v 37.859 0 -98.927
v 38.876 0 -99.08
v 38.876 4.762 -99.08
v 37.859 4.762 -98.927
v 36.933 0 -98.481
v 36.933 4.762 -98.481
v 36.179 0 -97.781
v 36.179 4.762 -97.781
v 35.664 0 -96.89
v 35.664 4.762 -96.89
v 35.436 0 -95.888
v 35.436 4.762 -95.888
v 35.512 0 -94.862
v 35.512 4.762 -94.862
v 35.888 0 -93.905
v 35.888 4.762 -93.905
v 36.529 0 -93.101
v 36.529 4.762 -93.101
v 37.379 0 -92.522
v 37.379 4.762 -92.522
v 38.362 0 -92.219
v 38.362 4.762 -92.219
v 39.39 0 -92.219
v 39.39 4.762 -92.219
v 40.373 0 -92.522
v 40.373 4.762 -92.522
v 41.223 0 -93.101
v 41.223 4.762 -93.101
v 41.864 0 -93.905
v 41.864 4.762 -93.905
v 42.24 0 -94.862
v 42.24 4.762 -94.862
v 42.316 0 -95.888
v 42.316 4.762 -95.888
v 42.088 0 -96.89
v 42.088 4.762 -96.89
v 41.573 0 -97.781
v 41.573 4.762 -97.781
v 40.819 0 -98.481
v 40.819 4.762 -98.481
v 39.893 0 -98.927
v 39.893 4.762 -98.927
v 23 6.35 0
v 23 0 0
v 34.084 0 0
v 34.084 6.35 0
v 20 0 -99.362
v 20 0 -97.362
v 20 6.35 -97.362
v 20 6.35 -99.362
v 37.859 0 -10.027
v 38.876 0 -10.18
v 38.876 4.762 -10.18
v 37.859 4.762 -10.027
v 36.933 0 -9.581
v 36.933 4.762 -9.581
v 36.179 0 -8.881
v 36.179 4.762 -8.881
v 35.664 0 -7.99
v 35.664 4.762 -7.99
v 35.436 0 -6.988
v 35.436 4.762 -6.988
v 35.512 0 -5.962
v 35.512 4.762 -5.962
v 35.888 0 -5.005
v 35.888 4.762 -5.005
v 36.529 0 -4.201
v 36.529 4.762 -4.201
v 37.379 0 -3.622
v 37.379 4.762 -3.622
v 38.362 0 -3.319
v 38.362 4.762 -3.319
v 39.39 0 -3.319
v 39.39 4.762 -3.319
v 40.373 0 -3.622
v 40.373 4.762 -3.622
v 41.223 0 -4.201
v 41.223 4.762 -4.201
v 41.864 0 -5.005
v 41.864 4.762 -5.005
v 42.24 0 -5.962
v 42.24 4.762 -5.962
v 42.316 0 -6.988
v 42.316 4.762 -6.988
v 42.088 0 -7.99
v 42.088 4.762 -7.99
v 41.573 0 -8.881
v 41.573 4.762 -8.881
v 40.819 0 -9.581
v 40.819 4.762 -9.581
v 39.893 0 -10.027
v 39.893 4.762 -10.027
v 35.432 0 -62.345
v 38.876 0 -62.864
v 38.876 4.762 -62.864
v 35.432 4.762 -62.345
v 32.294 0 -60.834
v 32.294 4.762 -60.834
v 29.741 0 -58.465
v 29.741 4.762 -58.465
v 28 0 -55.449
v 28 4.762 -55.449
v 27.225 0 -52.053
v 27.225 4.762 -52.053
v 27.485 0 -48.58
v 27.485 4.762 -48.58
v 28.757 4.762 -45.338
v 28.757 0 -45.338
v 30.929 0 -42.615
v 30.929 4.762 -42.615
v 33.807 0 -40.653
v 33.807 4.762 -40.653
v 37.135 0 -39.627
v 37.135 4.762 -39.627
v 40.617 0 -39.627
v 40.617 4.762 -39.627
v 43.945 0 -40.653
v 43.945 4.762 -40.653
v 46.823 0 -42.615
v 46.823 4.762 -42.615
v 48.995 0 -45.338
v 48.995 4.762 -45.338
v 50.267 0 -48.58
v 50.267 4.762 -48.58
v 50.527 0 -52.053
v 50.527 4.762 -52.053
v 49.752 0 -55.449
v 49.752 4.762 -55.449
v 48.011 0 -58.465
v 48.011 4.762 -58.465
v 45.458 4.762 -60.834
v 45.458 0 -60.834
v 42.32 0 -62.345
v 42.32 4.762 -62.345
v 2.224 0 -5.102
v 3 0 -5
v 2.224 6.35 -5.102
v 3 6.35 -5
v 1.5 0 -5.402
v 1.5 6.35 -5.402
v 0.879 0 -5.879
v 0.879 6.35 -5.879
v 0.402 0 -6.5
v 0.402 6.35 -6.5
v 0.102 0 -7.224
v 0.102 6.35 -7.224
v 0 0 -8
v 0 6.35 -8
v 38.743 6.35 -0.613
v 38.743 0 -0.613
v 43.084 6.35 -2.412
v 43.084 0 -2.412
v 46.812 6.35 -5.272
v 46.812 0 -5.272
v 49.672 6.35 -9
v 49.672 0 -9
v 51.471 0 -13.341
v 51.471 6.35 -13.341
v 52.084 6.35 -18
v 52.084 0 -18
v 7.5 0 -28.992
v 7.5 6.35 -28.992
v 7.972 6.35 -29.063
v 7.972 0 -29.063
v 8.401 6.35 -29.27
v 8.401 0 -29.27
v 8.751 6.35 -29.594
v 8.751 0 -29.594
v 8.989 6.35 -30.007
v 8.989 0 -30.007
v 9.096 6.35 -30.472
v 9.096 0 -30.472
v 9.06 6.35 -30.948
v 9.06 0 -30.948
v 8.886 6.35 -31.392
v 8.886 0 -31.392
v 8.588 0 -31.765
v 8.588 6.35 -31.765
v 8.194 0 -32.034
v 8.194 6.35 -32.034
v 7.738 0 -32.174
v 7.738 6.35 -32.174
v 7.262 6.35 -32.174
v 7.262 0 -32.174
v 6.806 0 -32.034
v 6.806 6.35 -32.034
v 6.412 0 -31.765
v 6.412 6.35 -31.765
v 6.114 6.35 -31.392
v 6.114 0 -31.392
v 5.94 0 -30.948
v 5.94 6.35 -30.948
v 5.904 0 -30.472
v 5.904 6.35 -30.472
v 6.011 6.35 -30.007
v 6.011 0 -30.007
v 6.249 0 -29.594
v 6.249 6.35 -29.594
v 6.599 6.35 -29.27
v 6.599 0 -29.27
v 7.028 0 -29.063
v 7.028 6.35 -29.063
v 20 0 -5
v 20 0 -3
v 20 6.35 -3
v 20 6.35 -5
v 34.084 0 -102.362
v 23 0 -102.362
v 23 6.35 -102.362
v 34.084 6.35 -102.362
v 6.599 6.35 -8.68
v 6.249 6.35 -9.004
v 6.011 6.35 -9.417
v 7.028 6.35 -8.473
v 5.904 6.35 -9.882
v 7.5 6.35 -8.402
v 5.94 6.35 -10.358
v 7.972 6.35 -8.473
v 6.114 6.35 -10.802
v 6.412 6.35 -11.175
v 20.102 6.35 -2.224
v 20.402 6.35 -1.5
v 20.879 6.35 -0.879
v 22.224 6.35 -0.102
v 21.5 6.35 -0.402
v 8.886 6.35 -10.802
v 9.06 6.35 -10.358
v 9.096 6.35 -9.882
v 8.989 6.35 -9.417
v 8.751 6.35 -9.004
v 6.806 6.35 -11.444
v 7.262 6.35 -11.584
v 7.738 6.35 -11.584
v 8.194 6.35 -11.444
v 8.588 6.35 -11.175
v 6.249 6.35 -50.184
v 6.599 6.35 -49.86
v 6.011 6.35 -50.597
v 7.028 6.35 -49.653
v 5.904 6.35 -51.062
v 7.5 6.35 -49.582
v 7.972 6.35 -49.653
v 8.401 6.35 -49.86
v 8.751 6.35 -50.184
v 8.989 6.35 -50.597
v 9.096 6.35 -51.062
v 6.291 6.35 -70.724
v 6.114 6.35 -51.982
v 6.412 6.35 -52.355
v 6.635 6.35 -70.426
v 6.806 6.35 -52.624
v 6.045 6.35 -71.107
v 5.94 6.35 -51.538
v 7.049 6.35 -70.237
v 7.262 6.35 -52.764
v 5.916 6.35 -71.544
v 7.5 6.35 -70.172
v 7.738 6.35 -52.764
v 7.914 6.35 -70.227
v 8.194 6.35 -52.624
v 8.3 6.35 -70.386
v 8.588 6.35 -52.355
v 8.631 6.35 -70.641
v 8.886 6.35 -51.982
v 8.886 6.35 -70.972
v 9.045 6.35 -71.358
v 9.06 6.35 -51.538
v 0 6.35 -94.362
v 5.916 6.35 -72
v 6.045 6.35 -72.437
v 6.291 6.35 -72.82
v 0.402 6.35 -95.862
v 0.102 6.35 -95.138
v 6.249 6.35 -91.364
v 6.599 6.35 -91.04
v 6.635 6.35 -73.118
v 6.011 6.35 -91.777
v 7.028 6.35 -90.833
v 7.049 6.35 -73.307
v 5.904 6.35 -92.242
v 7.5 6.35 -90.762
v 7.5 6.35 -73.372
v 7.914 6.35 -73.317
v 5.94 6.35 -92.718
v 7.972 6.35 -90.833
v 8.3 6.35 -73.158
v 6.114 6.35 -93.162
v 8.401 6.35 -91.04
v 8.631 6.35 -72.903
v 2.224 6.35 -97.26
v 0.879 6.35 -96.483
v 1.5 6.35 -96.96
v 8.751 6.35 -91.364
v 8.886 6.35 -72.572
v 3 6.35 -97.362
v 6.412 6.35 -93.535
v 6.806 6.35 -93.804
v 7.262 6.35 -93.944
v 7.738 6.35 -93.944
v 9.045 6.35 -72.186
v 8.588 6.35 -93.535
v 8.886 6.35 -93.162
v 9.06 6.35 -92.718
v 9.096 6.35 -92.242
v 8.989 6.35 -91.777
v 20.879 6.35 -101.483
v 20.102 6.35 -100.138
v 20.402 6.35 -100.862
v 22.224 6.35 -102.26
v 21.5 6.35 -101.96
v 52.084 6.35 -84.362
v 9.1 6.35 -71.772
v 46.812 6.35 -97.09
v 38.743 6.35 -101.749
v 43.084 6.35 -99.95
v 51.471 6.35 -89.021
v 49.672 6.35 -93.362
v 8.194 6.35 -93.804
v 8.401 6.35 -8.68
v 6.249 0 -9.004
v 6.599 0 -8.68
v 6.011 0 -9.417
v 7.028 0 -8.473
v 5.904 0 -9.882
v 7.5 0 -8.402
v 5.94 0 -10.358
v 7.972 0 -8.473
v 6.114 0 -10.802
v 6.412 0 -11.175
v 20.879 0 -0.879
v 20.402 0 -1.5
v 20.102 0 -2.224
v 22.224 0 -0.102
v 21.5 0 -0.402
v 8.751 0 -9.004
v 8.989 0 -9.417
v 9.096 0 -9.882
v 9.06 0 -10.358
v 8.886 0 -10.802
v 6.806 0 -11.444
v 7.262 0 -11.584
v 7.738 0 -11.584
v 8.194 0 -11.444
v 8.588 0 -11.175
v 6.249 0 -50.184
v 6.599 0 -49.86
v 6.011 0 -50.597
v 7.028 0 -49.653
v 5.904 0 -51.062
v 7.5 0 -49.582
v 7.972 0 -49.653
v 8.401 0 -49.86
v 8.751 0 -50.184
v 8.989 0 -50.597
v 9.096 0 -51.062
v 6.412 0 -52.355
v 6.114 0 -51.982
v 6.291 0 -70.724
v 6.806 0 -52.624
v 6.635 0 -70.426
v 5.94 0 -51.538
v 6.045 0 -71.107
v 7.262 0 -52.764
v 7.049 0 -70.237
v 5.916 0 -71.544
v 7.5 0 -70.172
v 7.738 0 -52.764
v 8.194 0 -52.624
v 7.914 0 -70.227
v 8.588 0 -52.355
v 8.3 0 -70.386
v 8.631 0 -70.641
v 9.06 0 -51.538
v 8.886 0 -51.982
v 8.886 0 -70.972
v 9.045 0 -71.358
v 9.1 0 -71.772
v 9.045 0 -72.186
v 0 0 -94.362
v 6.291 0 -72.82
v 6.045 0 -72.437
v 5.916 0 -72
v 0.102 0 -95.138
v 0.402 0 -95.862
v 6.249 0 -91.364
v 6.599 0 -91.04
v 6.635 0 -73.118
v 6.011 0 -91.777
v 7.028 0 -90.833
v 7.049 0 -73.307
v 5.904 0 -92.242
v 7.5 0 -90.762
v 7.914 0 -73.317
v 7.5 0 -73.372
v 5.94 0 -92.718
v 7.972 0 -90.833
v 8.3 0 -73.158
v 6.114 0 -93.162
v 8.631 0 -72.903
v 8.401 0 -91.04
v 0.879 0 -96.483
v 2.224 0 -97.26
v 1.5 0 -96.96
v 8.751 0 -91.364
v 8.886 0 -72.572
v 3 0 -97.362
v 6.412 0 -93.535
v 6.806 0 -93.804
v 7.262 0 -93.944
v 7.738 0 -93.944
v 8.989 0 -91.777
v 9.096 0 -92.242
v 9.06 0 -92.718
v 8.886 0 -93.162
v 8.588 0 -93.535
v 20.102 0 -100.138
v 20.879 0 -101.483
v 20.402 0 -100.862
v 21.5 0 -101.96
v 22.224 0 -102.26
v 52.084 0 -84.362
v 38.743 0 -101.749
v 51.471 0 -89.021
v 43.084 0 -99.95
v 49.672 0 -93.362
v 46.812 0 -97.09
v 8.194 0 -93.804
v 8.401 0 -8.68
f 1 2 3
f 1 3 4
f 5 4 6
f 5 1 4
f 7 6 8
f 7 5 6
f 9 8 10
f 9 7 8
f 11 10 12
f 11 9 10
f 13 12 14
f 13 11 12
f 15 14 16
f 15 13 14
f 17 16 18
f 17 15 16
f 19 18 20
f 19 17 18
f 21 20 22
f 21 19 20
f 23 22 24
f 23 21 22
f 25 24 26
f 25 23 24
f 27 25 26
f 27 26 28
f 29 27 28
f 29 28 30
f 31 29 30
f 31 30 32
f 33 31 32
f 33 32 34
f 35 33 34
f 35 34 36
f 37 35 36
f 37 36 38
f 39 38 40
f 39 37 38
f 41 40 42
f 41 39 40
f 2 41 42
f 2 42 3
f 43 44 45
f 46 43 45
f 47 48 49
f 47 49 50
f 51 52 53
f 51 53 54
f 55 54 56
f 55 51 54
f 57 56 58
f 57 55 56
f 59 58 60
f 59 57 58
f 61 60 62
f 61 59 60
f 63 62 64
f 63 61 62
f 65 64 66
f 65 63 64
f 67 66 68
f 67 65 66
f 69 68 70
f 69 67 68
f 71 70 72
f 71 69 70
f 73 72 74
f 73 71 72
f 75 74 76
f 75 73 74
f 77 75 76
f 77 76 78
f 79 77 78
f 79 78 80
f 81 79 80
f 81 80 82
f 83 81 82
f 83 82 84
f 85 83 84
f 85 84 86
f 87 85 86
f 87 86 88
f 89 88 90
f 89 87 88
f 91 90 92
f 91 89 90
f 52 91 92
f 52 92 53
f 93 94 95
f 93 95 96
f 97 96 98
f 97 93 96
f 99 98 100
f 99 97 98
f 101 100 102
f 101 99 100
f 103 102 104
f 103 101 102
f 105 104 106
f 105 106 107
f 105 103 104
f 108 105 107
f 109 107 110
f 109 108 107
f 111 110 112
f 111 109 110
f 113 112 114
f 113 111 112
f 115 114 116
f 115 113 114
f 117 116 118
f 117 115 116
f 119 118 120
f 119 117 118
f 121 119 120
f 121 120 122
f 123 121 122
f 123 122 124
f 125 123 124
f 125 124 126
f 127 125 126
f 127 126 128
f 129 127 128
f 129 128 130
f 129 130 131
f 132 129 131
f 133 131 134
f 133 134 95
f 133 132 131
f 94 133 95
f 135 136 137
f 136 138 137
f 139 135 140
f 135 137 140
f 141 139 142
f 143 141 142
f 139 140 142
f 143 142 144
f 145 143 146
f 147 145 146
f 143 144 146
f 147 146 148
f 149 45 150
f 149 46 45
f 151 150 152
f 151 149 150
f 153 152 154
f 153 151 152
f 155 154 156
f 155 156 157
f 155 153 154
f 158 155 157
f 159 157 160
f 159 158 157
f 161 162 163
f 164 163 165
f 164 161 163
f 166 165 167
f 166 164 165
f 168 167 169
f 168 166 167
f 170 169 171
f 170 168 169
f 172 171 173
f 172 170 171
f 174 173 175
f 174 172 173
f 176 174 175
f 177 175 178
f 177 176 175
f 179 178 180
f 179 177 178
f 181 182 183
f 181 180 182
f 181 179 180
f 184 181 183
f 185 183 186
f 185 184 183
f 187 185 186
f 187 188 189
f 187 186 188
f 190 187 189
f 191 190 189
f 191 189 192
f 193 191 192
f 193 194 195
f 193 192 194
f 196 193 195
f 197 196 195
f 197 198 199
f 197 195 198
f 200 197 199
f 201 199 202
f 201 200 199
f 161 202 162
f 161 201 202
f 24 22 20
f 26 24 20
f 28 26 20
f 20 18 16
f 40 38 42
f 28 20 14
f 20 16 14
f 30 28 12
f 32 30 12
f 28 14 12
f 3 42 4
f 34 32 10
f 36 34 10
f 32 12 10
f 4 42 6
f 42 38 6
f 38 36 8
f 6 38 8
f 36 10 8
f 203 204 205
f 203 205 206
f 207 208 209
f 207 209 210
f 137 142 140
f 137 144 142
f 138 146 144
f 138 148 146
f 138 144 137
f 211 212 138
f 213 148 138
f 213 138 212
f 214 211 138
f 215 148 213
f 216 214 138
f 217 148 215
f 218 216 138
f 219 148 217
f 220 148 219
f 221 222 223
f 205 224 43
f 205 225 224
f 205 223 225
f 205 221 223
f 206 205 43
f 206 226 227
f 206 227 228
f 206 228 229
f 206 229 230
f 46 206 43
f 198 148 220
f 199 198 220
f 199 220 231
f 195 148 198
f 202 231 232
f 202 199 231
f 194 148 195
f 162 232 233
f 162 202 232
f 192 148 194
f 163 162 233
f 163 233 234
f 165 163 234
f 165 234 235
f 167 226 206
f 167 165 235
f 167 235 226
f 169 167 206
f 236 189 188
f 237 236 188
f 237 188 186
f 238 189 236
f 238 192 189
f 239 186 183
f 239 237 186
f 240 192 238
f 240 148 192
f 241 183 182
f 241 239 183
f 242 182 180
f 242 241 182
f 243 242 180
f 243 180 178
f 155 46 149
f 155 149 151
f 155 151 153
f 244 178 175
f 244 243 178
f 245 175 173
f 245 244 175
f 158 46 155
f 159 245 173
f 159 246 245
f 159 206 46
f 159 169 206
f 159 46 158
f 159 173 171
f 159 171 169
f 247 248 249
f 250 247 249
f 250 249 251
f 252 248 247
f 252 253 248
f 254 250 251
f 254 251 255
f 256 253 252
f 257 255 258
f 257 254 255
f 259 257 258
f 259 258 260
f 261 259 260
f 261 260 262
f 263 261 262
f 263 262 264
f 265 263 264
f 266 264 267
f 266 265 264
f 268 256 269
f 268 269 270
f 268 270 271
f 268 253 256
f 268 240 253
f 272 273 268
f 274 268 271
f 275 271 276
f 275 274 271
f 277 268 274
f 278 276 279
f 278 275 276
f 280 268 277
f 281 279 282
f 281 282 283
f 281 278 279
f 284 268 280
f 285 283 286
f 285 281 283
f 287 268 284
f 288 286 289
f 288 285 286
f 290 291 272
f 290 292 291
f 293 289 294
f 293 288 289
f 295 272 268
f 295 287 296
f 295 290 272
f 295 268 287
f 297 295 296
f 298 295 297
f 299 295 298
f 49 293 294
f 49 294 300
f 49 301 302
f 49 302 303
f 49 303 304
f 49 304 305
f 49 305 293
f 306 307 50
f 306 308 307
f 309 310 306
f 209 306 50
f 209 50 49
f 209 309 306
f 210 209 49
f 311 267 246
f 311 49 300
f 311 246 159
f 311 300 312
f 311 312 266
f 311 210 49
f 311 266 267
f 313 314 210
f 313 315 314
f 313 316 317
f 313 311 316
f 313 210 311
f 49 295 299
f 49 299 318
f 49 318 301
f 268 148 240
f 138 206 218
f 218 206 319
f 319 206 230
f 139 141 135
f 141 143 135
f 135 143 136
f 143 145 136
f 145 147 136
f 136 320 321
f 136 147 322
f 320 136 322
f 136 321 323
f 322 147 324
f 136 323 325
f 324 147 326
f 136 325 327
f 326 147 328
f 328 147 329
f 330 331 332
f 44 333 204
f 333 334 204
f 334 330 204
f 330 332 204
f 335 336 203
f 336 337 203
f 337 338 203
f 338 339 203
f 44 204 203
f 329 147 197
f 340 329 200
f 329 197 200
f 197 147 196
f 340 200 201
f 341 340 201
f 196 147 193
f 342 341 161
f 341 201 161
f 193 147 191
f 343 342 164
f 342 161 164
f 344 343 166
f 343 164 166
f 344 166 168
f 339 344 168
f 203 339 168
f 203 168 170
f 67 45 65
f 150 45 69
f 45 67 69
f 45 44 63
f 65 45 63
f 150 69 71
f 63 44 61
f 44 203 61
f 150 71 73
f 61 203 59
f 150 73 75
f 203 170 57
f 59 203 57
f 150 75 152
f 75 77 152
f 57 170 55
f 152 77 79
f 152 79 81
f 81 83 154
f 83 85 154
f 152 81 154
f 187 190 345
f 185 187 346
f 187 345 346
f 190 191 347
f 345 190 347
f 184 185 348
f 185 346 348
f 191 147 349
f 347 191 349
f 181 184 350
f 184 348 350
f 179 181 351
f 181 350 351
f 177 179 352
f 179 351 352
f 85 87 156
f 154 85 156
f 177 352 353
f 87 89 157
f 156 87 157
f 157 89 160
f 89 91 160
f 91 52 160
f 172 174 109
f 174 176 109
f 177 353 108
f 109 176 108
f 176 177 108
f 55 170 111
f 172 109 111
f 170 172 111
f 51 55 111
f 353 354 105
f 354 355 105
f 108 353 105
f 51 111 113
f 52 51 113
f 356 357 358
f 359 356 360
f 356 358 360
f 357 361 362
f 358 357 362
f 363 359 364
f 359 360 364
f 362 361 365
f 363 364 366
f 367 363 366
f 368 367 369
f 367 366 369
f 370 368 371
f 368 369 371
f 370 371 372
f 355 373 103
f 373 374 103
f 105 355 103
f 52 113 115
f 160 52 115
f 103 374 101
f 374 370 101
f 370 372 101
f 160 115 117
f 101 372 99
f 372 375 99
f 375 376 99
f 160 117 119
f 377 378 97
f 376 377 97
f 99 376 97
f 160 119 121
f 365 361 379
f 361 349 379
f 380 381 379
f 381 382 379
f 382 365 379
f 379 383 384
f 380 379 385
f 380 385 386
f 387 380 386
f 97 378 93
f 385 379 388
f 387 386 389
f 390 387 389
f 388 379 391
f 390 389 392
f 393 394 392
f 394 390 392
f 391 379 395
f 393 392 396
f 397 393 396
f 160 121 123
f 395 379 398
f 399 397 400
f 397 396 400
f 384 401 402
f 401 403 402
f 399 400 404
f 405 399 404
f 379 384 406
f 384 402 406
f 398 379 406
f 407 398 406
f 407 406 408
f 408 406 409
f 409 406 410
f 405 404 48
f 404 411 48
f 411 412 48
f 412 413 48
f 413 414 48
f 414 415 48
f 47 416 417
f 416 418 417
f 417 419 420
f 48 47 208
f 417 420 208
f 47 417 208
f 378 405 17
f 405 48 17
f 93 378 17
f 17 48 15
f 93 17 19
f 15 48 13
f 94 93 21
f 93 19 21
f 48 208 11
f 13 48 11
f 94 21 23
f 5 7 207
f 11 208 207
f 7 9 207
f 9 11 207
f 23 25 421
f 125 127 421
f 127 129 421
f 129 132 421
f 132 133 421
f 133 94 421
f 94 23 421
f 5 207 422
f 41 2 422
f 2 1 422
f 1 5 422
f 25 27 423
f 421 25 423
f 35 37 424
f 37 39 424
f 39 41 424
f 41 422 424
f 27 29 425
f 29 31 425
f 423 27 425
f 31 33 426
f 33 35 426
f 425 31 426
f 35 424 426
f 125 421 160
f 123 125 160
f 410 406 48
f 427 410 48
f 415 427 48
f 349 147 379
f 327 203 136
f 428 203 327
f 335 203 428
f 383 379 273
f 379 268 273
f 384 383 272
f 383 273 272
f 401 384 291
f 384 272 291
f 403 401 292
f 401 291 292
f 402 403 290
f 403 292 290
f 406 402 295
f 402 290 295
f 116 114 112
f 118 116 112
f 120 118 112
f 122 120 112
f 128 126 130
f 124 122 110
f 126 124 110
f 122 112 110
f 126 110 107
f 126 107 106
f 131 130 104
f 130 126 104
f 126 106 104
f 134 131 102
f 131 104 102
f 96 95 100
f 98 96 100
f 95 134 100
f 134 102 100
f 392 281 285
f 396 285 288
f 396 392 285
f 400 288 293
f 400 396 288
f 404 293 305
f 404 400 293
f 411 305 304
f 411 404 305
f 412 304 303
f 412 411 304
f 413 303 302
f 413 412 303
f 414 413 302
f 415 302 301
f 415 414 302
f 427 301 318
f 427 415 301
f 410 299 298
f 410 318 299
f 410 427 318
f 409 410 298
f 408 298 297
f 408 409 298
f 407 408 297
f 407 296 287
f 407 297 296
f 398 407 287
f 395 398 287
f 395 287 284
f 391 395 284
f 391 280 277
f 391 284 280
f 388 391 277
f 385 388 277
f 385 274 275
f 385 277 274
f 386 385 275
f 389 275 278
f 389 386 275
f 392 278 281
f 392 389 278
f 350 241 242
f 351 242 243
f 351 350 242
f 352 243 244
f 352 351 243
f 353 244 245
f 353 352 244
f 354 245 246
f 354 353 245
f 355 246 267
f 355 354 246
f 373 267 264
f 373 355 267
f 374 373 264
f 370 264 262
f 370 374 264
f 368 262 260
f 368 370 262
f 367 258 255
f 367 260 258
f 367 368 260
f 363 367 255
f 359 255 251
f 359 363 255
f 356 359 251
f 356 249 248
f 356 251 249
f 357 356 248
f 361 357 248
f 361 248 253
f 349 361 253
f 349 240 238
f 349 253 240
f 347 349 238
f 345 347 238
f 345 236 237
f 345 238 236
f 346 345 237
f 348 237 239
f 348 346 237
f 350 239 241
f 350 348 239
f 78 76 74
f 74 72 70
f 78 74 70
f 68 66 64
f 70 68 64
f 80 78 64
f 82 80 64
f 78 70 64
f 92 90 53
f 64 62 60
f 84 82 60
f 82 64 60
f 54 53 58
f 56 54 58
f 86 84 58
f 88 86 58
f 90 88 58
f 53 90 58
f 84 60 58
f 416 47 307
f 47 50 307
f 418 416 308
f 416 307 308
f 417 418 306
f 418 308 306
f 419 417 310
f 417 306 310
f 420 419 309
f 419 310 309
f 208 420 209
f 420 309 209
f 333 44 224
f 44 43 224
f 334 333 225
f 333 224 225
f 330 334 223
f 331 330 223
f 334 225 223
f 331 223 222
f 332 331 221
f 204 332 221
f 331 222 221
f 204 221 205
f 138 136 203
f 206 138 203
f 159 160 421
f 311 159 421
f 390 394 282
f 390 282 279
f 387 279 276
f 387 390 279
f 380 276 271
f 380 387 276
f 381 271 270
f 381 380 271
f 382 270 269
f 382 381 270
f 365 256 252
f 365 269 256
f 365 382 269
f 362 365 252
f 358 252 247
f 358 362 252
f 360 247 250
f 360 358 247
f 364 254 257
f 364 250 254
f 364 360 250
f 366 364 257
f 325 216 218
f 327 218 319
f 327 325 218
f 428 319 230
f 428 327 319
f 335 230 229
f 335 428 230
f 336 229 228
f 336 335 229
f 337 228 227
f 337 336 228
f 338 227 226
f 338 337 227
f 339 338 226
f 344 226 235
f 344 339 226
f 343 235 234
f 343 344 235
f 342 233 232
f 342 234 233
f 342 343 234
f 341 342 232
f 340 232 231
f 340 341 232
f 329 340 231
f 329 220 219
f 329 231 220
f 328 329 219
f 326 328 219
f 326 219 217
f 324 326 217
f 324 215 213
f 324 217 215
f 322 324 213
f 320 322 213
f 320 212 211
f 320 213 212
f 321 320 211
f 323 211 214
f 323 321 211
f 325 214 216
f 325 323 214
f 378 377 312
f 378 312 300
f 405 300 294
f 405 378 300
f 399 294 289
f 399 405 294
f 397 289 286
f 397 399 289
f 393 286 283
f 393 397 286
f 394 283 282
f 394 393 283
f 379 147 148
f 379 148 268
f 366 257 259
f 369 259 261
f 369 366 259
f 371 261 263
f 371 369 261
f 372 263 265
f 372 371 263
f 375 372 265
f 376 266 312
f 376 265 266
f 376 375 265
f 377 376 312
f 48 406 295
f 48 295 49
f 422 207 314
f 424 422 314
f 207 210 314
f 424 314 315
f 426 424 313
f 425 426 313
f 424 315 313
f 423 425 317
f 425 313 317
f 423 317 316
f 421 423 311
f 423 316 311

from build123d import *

# Parameters (mm, degrees)
SKETCH1_W           = 52.084
SKETCH1_H           = 102.362
BOSS_EXTRUDE1_DEPTH = 6.35
SKETCH1_4_R         = 1.6
CUT_EXTRUDE2_DEPTH  = 116.026277867
SKETCH1_5_R         = 11.684
SKETCH1_5_R_2       = 3.45
CUT_EXTRUDE3_DEPTH  = 4.7625
FILLET1_R           = 18
SKETCH1_7_W         = 20
SKETCH1_7_H         = 5
CUT_EXTRUDE4_DEPTH  = 116.026277867
FILLET4_R           = 3


with BuildPart() as part:
    # Sketch1 → Boss-Extrude1 (new body)
    with BuildSketch(Plane(origin=(0, 0, 0), x_dir=(1, 0, 0), z_dir=(0, 1, 0))):
        with Locations((26.042, 51.181)):
            Rectangle(SKETCH1_W, SKETCH1_H)
    extrude(amount=BOSS_EXTRUDE1_DEPTH)

    # Sketch1<4> → Cut-Extrude2 (cut, through all)
    with BuildSketch(Plane(origin=(0, 0, 0), x_dir=(1, 0, 0), z_dir=(0, 1, 0))):
        with BuildLine():
            ThreePointArc((9.1, 71.772), (8.63137085, 72.90337085), (7.5, 73.372))
            Line((7.5, 73.372), (7.5, 70.172))
            ThreePointArc((7.5, 70.172), (8.63137085, 70.64062915), (9.1, 71.772))
        make_face()
        with BuildLine():
            Line((7.5, 70.172), (7.5, 73.372))
            ThreePointArc((7.5, 73.372), (5.9, 71.772), (7.5, 70.172))
        make_face()
        with Locations(Location((7.5, 92.362, 0), (0, 0, 270))):
            Circle(SKETCH1_4_R)
        with Locations(Location((7.5, 51.182, 0), (0, 0, 270))):
            Circle(SKETCH1_4_R)
        with Locations(Location((7.5, 30.592, 0), (0, 0, 270))):
            Circle(SKETCH1_4_R)
        with Locations(Location((7.5, 10.002, 0), (0, 0, 270))):
            Circle(SKETCH1_4_R)
    extrude(amount=CUT_EXTRUDE2_DEPTH, mode=Mode.SUBTRACT)

    # Sketch1<5> → Cut-Extrude3 (cut)
    with BuildSketch(Plane(origin=(0, 0, 0), x_dir=(1, 0, 0), z_dir=(0, 1, 0))):
        with Locations(Location((38.876, 51.18, 0), (0, 0, 90))):
            Circle(SKETCH1_5_R)
        with Locations(Location((38.876, 95.63, 0), (0, 0, 90))):
            Circle(SKETCH1_5_R_2)
        with Locations(Location((38.876, 6.73, 0), (0, 0, 90))):
            Circle(SKETCH1_5_R_2)
    extrude(amount=CUT_EXTRUDE3_DEPTH, mode=Mode.SUBTRACT)

    # Fillet1
    fillet1_edges = [part.edges().sort_by_distance(p)[0] for p in [
        (52.084, 3.175, 0),
        (52.084, 3.175, -102.362),
    ]]
    fillet(fillet1_edges, radius=FILLET1_R)

    # Sketch1<7> → Cut-Extrude4 (cut, through all)
    with BuildSketch(Plane(origin=(0, 0, 0), x_dir=(1, 0, 0), z_dir=(0, 1, 0))):
        with Locations((10, 2.5)):
            Rectangle(SKETCH1_7_W, SKETCH1_7_H)
        with Locations((10, 99.862)):
            Rectangle(SKETCH1_7_W, SKETCH1_7_H)
    extrude(amount=CUT_EXTRUDE4_DEPTH, mode=Mode.SUBTRACT)

    # Fillet4
    fillet4_edges = [part.edges().sort_by_distance(p)[0] for p in [
        (0, 3.175, -5),
        (20, 3.175, 0),
        (0, 3.175, -97.362),
        (20, 3.175, -102.362),
    ]]
    fillet(fillet4_edges, radius=FILLET4_R)


solid = part.part
